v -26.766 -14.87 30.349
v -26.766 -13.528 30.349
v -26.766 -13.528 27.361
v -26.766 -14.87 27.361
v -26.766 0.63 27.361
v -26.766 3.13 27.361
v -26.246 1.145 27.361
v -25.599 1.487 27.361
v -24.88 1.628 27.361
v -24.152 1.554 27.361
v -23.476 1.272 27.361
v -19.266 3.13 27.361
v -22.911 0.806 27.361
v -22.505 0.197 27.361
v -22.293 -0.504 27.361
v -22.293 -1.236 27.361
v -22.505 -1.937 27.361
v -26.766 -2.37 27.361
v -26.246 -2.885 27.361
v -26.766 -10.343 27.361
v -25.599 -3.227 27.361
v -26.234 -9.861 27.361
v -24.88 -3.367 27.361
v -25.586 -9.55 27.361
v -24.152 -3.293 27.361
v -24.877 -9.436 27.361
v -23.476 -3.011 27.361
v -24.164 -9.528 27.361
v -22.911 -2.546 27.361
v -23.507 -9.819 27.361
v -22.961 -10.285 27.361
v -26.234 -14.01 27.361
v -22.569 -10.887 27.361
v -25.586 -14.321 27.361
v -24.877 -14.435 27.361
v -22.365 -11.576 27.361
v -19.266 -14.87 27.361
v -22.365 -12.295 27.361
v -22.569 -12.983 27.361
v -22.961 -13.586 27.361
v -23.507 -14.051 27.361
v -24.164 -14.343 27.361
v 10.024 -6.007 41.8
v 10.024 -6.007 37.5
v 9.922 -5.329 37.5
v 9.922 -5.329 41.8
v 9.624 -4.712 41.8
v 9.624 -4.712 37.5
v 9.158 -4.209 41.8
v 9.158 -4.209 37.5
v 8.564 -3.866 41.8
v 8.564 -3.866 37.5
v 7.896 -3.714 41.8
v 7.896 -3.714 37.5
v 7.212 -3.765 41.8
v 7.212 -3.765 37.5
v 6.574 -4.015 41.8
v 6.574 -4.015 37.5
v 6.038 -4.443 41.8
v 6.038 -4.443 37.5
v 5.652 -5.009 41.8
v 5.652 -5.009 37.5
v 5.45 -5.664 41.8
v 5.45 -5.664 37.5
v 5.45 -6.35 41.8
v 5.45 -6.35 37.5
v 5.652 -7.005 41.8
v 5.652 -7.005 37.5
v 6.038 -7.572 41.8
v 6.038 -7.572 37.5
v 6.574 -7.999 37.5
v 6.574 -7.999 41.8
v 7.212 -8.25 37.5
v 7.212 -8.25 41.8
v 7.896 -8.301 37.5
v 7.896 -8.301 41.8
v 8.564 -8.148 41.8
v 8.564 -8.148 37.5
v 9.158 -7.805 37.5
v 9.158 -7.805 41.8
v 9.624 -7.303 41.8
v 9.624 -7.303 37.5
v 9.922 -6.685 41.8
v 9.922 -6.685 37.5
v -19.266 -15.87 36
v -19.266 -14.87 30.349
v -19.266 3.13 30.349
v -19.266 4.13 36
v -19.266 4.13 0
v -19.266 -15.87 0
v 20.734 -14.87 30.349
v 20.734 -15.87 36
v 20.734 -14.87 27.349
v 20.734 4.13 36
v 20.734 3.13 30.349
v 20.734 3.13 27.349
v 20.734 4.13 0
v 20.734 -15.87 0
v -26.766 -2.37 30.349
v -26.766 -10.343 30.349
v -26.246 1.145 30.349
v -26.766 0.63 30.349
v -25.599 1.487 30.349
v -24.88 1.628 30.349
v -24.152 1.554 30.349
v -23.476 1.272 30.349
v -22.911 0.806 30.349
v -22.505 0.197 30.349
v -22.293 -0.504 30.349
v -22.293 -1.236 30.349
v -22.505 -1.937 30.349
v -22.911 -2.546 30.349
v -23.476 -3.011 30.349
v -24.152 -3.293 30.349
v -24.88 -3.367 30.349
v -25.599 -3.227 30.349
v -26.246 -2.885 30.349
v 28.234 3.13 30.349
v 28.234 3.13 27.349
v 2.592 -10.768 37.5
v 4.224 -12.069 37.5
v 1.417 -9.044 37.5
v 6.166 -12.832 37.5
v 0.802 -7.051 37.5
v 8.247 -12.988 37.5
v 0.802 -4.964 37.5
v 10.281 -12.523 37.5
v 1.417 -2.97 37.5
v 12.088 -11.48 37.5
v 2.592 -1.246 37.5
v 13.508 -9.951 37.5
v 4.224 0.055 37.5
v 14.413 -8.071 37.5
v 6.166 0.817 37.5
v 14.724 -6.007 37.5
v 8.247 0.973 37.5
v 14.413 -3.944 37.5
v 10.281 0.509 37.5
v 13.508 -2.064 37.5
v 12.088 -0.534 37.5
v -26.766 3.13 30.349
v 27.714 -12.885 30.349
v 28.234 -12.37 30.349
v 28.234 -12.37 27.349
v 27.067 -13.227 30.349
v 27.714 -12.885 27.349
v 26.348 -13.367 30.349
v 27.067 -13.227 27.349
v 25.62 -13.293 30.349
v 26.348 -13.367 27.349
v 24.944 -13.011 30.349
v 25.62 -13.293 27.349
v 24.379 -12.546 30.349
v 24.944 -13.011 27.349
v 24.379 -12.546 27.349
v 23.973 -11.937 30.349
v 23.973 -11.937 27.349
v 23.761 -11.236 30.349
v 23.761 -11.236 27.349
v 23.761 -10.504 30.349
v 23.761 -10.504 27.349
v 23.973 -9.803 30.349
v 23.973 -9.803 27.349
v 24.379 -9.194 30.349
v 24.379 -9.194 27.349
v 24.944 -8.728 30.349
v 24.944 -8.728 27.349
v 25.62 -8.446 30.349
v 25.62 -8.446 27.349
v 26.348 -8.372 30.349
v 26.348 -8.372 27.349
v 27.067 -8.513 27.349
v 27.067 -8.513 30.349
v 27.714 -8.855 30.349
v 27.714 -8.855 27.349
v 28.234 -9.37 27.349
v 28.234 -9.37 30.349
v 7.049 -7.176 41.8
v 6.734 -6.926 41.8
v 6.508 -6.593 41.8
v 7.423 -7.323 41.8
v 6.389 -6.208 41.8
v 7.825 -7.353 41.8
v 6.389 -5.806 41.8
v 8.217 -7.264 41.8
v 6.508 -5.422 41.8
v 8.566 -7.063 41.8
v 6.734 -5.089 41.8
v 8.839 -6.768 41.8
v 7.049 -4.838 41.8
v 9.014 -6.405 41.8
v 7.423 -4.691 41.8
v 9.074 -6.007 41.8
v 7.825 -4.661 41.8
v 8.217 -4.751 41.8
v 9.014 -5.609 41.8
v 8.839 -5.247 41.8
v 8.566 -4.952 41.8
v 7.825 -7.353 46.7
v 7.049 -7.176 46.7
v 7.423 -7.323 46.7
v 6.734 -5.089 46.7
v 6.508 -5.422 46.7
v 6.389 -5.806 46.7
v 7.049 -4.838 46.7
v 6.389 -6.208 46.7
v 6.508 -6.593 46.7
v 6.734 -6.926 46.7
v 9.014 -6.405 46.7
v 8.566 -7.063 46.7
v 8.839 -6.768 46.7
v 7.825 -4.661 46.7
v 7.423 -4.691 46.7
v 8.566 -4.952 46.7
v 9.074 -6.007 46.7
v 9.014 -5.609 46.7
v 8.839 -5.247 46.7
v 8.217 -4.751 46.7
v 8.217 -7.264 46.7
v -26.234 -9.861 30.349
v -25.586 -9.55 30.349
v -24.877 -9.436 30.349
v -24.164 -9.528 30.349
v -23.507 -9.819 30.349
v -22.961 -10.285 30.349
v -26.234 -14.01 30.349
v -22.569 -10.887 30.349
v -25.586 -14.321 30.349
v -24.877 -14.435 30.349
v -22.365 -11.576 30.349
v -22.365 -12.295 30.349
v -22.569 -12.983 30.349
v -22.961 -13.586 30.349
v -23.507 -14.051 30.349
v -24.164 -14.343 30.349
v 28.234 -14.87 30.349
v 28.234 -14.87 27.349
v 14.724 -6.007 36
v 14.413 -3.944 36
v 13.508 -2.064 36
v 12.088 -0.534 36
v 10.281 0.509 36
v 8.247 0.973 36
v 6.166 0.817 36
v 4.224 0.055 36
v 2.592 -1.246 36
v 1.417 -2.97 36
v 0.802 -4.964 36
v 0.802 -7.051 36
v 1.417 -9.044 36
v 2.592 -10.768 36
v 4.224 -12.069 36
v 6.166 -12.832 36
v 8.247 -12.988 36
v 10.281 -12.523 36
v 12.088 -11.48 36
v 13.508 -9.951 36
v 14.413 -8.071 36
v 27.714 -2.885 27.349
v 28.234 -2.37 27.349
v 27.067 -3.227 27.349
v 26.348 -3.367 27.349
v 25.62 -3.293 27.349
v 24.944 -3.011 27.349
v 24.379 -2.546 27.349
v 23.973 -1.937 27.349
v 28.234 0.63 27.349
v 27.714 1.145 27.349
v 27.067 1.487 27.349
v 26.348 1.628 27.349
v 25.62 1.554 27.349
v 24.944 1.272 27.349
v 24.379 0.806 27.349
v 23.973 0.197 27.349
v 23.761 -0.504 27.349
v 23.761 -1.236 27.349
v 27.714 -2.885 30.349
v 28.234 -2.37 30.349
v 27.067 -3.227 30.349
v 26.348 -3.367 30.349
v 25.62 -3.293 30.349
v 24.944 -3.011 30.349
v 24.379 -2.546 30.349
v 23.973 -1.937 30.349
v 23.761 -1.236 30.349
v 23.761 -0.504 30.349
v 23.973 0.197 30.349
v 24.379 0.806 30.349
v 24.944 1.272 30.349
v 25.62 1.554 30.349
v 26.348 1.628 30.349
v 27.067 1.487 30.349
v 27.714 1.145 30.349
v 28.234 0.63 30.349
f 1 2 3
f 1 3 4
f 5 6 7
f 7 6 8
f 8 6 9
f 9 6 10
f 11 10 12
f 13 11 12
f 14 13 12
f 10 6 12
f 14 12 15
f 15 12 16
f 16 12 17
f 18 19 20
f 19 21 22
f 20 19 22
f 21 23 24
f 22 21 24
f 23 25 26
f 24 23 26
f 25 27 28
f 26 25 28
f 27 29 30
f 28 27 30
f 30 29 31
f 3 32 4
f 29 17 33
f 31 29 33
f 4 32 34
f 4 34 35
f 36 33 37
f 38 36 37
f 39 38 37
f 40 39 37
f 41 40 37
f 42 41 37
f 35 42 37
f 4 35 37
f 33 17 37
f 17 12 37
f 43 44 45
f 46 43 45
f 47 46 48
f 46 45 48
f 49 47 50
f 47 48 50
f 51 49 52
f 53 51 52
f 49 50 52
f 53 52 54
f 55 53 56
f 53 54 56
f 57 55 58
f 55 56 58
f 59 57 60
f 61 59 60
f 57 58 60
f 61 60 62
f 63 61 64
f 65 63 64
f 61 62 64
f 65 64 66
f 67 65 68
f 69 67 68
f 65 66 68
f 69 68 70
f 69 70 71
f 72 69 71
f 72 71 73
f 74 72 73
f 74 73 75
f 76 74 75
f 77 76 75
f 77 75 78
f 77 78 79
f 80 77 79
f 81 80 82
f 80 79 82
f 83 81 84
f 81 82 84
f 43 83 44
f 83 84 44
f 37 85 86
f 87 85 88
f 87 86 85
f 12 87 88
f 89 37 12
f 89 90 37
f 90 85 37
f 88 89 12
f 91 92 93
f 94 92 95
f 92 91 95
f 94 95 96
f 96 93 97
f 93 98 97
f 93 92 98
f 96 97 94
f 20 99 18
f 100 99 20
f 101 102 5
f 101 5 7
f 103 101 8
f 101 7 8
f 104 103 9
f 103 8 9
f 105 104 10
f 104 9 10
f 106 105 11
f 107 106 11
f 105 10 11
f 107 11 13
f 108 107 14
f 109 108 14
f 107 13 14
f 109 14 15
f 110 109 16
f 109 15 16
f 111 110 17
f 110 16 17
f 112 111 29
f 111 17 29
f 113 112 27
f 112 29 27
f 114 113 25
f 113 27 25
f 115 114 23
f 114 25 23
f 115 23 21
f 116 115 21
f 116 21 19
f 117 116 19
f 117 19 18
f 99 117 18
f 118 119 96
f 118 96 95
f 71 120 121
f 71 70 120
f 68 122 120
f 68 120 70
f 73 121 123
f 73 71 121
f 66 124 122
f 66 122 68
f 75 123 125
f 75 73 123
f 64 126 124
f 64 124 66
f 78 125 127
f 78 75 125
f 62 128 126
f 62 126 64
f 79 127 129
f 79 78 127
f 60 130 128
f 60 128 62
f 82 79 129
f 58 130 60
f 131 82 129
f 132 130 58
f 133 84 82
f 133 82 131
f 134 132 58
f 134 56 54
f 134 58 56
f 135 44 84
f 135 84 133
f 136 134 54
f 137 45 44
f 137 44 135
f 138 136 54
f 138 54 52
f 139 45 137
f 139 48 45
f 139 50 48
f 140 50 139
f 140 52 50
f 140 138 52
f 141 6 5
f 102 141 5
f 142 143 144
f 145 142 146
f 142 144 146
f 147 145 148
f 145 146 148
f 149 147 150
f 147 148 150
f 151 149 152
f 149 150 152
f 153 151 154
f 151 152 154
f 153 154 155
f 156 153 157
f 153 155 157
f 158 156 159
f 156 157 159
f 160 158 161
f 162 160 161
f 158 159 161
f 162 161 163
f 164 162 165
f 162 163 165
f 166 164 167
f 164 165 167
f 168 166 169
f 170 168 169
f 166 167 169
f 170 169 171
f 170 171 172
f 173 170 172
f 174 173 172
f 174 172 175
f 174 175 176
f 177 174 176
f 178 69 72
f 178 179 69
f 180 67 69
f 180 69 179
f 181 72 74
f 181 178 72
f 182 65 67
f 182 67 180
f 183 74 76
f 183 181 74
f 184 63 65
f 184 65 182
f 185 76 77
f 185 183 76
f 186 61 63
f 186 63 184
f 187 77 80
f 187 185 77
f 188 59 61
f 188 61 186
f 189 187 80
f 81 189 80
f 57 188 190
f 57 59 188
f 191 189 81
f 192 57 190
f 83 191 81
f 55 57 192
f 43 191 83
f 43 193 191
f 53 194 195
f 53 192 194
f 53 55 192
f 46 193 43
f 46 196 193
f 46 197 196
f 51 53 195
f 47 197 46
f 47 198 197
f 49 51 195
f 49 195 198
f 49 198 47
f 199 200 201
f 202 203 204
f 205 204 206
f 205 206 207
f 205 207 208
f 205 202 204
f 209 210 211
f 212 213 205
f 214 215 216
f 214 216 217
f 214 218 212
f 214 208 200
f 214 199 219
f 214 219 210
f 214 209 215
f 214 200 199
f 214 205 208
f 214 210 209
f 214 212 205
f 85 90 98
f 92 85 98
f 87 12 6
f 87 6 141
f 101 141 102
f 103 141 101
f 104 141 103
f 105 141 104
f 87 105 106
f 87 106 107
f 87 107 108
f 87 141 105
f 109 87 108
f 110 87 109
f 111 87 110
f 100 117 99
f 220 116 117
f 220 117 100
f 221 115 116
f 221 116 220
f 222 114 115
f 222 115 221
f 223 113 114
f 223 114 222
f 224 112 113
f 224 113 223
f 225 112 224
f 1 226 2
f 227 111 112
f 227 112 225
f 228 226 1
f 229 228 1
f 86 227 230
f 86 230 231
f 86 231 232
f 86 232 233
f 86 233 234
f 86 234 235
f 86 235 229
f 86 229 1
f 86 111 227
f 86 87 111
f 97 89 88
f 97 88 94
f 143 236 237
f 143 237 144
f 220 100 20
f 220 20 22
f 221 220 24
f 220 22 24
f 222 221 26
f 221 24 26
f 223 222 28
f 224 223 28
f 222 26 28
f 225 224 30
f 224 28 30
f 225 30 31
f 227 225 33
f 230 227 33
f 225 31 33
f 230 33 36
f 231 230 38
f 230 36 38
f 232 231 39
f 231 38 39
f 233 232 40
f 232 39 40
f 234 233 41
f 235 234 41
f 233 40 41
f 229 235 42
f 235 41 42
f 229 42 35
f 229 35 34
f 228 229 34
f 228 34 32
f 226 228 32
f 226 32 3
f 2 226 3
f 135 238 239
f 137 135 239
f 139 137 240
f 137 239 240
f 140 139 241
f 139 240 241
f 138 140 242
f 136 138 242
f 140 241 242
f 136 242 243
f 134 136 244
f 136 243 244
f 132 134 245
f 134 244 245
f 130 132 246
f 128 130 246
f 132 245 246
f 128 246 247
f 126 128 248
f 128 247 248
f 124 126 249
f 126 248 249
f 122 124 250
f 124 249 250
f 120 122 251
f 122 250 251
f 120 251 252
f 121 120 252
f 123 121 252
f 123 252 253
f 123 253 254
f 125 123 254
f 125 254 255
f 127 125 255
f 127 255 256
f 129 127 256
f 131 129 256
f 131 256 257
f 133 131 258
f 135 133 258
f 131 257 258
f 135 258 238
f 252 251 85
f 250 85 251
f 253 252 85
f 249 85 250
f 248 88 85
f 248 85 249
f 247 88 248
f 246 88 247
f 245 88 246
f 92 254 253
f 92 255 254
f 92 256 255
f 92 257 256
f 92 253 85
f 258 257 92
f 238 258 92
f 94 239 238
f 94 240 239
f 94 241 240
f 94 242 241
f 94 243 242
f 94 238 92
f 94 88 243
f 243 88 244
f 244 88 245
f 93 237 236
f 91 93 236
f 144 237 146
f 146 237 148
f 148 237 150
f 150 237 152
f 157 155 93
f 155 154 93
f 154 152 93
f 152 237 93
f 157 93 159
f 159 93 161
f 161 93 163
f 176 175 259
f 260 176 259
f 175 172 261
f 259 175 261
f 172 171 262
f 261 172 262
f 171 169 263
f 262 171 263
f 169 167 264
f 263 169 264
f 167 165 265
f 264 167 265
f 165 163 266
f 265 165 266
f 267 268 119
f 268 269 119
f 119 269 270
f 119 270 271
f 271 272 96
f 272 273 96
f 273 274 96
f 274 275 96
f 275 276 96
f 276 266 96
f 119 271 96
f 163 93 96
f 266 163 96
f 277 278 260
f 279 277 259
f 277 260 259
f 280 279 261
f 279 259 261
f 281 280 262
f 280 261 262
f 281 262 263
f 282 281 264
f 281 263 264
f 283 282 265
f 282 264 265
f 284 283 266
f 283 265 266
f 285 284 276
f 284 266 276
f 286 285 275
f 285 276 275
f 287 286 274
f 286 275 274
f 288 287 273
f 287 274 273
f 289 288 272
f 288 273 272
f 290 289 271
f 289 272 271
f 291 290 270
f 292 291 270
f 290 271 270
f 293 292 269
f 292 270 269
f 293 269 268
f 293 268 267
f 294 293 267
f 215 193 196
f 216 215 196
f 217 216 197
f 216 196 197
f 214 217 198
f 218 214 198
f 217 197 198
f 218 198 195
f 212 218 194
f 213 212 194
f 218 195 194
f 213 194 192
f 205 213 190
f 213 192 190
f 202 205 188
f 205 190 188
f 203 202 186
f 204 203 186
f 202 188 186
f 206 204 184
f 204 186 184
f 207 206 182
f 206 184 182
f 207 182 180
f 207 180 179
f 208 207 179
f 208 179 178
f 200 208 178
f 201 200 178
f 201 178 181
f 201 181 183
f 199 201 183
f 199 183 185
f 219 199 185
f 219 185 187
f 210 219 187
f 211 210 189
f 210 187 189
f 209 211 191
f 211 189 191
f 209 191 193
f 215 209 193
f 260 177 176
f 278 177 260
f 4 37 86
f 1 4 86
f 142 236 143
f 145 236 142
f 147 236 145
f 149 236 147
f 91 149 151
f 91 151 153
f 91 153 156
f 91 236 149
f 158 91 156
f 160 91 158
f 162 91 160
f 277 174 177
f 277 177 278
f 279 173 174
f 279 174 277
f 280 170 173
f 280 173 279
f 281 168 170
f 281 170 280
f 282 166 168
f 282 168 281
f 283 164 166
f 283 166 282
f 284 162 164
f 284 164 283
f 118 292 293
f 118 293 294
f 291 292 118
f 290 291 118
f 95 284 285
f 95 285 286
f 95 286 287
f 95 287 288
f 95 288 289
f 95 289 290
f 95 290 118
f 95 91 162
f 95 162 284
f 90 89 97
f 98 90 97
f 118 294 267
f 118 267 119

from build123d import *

# Parameters (mm, degrees)
F0_W      = 40
F0_H      = 20
F1_DEPTH  = 36
F2_W      = 18
F2_H      = 3
F3_DEPTH  = 7.5
F4_W      = 18
F4_H      = 2.9874
F5_DEPTH  = 7.5
F8_D      = 5
F9_R      = 7
F10_DEPTH = 1.5
F11_R     = 2.3
F12_DEPTH = 4.3
F13_R     = 1.35
F14_DEPTH = 4.9


with BuildPart() as f1:
    # F0 (on Top) → F1 (new body)
    with BuildSketch(Plane.XY):
        with Locations((0.734034, -5.869799)):
            Rectangle(F0_W, F0_H)
    extrude(amount=F1_DEPTH)

    # F2 (on face) → F3 (join)
    with BuildSketch(Plane.YZ.offset(20.734034)):
        with Locations((-5.869799, 28.848891)):
            Rectangle(F2_W, F2_H)
    extrude(amount=F3_DEPTH)

    # F4 (on face) → F5 (join)
    with BuildSketch(Plane(origin=(-19.265966, 0, 0), x_dir=(0, -1, 0), z_dir=(-1, 0, 0))):
        with Locations((5.869799, 28.855191)):
            Rectangle(F4_W, F4_H)
    extrude(amount=F5_DEPTH)

    # F8 (through all)
    with Locations(Plane.XY.offset(30.348891)):
        with Locations((-24.765966, -0.869799), (-24.838559, -11.935355), (26.234034, -10.869799), (26.234034, -0.869799)):
            Hole(F8_D / 2)

    # F9 (on face) → F10 (join)
    with BuildSketch(Plane.XY.offset(36)):
        with Locations((7.723857, -6.007267)):
            Circle(F9_R)
    extrude(amount=F10_DEPTH)

    # F11 (on face) → F12 (join)
    with BuildSketch(Plane.XY.offset(37.5)):
        with Locations((7.723857, -6.007267)):
            Circle(F11_R)
    extrude(amount=F12_DEPTH)

    # F13 (on face) → F14 (join)
    with BuildSketch(Plane.XY.offset(41.8)):
        with Locations((7.723857, -6.007267)):
            Circle(F13_R)
    extrude(amount=F14_DEPTH)


solid = f1.part
